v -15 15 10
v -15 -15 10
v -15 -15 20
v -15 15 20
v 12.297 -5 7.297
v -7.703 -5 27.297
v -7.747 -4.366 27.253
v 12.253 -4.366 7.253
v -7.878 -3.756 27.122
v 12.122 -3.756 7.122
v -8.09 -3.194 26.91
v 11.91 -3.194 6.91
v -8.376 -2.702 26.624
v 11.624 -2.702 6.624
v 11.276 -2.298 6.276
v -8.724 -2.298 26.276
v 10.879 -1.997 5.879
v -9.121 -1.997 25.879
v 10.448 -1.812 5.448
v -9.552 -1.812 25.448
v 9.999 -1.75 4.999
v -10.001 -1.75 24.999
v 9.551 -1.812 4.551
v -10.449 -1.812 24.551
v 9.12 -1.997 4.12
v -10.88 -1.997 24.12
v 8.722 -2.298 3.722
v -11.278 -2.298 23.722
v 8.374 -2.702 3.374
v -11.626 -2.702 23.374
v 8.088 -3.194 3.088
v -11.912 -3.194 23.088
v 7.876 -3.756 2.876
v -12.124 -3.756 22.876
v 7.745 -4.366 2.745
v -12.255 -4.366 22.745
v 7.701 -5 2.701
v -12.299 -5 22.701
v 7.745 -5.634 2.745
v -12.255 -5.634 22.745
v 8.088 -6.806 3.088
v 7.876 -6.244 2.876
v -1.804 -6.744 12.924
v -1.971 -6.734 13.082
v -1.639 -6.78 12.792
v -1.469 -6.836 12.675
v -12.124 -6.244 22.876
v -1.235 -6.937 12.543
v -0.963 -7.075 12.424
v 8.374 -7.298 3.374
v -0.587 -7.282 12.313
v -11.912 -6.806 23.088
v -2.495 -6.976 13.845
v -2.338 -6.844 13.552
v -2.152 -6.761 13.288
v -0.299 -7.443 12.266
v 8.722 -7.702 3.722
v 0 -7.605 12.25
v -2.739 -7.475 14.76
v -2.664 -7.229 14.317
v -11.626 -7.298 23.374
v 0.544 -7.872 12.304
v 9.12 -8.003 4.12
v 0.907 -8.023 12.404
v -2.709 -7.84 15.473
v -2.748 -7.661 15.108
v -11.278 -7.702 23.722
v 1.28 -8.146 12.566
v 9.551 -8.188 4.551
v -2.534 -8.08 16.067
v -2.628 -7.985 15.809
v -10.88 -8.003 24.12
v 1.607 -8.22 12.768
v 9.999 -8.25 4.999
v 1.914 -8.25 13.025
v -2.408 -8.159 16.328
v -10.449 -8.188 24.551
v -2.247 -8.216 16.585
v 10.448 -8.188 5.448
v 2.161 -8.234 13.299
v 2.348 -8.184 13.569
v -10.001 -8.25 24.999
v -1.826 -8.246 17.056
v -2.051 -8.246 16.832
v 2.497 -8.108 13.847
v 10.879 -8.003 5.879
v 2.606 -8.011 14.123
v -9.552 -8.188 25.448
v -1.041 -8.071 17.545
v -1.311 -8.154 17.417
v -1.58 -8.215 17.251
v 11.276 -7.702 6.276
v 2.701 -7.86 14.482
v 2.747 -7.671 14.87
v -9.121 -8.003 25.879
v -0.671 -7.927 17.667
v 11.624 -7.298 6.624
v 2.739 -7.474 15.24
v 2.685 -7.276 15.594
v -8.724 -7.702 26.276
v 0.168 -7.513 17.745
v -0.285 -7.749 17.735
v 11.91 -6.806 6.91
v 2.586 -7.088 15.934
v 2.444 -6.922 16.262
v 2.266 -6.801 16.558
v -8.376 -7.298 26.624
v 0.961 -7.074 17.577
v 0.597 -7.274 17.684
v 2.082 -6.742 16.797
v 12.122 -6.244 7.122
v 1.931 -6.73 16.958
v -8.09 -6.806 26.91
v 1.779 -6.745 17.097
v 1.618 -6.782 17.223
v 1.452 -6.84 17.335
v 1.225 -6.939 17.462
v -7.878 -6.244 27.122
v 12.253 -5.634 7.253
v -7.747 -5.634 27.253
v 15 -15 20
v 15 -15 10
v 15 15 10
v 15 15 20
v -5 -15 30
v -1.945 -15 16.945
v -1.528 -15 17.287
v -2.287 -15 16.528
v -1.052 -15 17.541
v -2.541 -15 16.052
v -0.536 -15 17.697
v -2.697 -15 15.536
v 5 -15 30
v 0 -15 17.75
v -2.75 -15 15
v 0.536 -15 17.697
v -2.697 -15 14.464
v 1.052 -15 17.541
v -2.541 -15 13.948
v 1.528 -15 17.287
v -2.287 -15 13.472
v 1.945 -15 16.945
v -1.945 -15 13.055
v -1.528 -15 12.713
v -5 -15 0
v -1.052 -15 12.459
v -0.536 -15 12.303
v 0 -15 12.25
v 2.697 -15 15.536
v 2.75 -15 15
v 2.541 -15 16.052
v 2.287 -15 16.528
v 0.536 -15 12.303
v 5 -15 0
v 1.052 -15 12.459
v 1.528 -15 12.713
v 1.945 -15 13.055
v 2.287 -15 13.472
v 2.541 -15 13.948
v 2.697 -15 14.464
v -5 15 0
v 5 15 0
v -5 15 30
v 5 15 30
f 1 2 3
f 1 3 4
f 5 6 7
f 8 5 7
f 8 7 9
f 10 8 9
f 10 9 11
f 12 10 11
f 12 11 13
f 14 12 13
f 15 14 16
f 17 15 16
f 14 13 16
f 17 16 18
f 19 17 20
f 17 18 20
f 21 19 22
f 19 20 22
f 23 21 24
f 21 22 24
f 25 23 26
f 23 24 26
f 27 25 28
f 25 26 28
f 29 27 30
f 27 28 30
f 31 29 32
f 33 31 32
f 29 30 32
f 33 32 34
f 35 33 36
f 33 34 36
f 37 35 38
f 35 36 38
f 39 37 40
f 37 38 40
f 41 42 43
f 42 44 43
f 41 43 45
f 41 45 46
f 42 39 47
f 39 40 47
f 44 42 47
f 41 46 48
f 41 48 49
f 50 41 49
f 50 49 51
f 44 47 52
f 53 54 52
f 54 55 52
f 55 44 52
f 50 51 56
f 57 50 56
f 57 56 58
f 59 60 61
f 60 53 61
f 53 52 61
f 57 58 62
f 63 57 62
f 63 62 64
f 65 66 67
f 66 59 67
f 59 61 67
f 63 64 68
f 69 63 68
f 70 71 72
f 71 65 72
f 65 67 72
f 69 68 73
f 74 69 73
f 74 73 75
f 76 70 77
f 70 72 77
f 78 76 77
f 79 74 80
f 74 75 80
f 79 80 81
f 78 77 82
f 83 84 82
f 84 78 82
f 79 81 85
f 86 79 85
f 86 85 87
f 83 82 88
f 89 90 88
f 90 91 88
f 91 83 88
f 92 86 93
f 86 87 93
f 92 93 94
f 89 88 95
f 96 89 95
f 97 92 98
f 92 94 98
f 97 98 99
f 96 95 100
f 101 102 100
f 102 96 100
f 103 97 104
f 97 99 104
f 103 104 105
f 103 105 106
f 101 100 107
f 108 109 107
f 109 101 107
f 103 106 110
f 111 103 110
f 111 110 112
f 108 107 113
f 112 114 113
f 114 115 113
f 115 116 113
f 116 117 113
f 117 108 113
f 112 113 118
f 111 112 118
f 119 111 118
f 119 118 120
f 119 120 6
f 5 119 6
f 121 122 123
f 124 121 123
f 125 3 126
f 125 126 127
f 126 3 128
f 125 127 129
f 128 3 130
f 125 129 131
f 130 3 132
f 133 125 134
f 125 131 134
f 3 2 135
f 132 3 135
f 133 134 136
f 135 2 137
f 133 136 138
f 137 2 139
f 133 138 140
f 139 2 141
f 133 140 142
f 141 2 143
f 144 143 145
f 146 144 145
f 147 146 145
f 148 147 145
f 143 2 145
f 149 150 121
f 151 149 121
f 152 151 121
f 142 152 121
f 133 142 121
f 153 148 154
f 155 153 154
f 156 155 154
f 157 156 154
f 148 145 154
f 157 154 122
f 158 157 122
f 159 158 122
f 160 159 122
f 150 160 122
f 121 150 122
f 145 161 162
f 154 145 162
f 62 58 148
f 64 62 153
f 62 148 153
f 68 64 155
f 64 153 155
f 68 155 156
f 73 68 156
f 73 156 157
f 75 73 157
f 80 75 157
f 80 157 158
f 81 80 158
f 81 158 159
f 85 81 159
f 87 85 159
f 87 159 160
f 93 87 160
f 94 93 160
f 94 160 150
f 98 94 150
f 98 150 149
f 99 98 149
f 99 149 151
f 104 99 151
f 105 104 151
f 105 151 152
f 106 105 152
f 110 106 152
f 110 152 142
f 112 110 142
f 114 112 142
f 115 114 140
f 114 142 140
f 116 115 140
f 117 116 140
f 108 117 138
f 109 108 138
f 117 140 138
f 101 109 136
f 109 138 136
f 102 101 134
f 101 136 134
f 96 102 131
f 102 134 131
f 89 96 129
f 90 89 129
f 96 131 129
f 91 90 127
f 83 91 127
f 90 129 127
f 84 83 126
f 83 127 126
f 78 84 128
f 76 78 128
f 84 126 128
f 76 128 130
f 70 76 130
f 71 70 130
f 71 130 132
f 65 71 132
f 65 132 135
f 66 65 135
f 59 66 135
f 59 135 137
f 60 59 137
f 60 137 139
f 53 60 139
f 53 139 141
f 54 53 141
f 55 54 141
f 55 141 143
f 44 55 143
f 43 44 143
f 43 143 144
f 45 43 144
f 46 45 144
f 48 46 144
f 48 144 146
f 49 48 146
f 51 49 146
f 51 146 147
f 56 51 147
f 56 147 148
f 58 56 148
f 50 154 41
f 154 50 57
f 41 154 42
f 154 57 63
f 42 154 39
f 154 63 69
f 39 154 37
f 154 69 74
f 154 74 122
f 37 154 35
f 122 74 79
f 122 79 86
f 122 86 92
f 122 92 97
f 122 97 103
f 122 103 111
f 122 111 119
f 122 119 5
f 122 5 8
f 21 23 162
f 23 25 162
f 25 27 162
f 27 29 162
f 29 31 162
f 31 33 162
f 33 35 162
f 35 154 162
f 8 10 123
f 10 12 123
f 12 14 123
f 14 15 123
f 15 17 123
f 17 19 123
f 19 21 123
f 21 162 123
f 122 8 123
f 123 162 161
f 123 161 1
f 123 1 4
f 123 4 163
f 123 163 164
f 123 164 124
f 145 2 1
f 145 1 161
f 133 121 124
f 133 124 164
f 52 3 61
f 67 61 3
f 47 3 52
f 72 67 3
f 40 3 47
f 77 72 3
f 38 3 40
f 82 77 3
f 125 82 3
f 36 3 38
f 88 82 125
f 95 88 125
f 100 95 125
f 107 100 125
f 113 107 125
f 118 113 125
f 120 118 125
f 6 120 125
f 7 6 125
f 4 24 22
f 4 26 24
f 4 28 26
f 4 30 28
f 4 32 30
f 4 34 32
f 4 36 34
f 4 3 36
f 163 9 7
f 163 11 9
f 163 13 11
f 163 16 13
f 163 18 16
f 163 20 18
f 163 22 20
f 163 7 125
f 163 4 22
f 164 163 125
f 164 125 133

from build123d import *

# Parameters (mm, degrees)
ESQUISSE1_W             = 30
ESQUISSE1_H             = 30
BOSS_EXTRU_1_DEPTH      = 30
ENL_V_MAT_EXTRU_1_REACH = 47
ENL_V_MAT_EXTRU_2_REACH = 41.843
ESQUISSE4_R             = 3.25
ESQUISSE6_R             = 2.75
ENL_V_MAT_EXTRU_3_DEPTH = 10


with BuildPart() as part:
    # Esquisse1 → Boss.-Extru.1 (new body)
    with BuildSketch(Plane.XY):
        Rectangle(ESQUISSE1_W, ESQUISSE1_H)
    extrude(amount=BOSS_EXTRU_1_DEPTH)

    # Esquisse3 → Enlèv. mat.-Extru.1 (cut, up to next)
    with BuildSketch(Plane(origin=(0, 15, 0), x_dir=(1, 0, 0), z_dir=(0, 1, 0)), mode=Mode.PRIVATE) as enl_v_mat_extru_1_sk1:
        Polygon((-15, -20), (-5, -30), (-15, -30), align=None)
    enl_v_mat_extru_1_tool1 = extrude(enl_v_mat_extru_1_sk1.sketch, amount=-ENL_V_MAT_EXTRU_1_REACH, mode=Mode.PRIVATE) & part.part
    # Esquisse3 → Enlèv. mat.-Extru.1 (cut, up to next)
    with BuildSketch(Plane(origin=(0, 15, 0), x_dir=(1, 0, 0), z_dir=(0, 1, 0)), mode=Mode.PRIVATE) as enl_v_mat_extru_1_sk2:
        Polygon((-15, 0), (-15, -10), (-5, 0), align=None)
    enl_v_mat_extru_1_tool2 = extrude(enl_v_mat_extru_1_sk2.sketch, amount=-ENL_V_MAT_EXTRU_1_REACH, mode=Mode.PRIVATE) & part.part
    # Esquisse3 → Enlèv. mat.-Extru.1 (cut, up to next)
    with BuildSketch(Plane(origin=(0, 15, 0), x_dir=(1, 0, 0), z_dir=(0, 1, 0)), mode=Mode.PRIVATE) as enl_v_mat_extru_1_sk3:
        Polygon((15, 0), (5, 0), (15, -10), align=None)
    enl_v_mat_extru_1_tool3 = extrude(enl_v_mat_extru_1_sk3.sketch, amount=-ENL_V_MAT_EXTRU_1_REACH, mode=Mode.PRIVATE) & part.part
    # Esquisse3 → Enlèv. mat.-Extru.1 (cut, up to next)
    with BuildSketch(Plane(origin=(0, 15, 0), x_dir=(1, 0, 0), z_dir=(0, 1, 0)), mode=Mode.PRIVATE) as enl_v_mat_extru_1_sk4:
        Polygon((15, -30), (15, -20), (5, -30), align=None)
    enl_v_mat_extru_1_tool4 = extrude(enl_v_mat_extru_1_sk4.sketch, amount=-ENL_V_MAT_EXTRU_1_REACH, mode=Mode.PRIVATE) & part.part
    add(enl_v_mat_extru_1_tool1.solids().sort_by_distance((-11.666667, 15, 26.666667))[0], mode=Mode.SUBTRACT)
    add(enl_v_mat_extru_1_tool2.solids().sort_by_distance((-11.666667, 15, 3.333333))[0], mode=Mode.SUBTRACT)
    add(enl_v_mat_extru_1_tool3.solids().sort_by_distance((11.666667, 15, 3.333333))[0], mode=Mode.SUBTRACT)
    add(enl_v_mat_extru_1_tool4.solids().sort_by_distance((11.666667, 15, 26.666667))[0], mode=Mode.SUBTRACT)

    # Esquisse4 → Enlèv. mat.-Extru.2 (cut, up to next)
    with BuildSketch(Plane(origin=(-17.5, 0, 17.5), x_dir=(0.7071067811865489, 0, 0.7071067811865462), z_dir=(-0.7071067811865462, 0, 0.7071067811865489)), mode=Mode.PRIVATE) as enl_v_mat_extru_2_sk1:
        with Locations((10.605533906, -5)):
            Circle(ESQUISSE4_R)
    enl_v_mat_extru_2_tool1 = extrude(enl_v_mat_extru_2_sk1.sketch, amount=-ENL_V_MAT_EXTRU_2_REACH, mode=Mode.PRIVATE) & part.part
    add(enl_v_mat_extru_2_tool1.solids().sort_by_distance((-10.000755, -5, 24.999245))[0], mode=Mode.SUBTRACT)

    # Esquisse6 → Enlèv. mat.-Extru.3 (cut)
    with BuildSketch(Plane.XZ.offset(15)):
        with Locations(Location((0, 15, 0), (0, 0, 270))):
            Circle(ESQUISSE6_R)
    extrude(amount=-ENL_V_MAT_EXTRU_3_DEPTH, mode=Mode.SUBTRACT)


solid = part.part
